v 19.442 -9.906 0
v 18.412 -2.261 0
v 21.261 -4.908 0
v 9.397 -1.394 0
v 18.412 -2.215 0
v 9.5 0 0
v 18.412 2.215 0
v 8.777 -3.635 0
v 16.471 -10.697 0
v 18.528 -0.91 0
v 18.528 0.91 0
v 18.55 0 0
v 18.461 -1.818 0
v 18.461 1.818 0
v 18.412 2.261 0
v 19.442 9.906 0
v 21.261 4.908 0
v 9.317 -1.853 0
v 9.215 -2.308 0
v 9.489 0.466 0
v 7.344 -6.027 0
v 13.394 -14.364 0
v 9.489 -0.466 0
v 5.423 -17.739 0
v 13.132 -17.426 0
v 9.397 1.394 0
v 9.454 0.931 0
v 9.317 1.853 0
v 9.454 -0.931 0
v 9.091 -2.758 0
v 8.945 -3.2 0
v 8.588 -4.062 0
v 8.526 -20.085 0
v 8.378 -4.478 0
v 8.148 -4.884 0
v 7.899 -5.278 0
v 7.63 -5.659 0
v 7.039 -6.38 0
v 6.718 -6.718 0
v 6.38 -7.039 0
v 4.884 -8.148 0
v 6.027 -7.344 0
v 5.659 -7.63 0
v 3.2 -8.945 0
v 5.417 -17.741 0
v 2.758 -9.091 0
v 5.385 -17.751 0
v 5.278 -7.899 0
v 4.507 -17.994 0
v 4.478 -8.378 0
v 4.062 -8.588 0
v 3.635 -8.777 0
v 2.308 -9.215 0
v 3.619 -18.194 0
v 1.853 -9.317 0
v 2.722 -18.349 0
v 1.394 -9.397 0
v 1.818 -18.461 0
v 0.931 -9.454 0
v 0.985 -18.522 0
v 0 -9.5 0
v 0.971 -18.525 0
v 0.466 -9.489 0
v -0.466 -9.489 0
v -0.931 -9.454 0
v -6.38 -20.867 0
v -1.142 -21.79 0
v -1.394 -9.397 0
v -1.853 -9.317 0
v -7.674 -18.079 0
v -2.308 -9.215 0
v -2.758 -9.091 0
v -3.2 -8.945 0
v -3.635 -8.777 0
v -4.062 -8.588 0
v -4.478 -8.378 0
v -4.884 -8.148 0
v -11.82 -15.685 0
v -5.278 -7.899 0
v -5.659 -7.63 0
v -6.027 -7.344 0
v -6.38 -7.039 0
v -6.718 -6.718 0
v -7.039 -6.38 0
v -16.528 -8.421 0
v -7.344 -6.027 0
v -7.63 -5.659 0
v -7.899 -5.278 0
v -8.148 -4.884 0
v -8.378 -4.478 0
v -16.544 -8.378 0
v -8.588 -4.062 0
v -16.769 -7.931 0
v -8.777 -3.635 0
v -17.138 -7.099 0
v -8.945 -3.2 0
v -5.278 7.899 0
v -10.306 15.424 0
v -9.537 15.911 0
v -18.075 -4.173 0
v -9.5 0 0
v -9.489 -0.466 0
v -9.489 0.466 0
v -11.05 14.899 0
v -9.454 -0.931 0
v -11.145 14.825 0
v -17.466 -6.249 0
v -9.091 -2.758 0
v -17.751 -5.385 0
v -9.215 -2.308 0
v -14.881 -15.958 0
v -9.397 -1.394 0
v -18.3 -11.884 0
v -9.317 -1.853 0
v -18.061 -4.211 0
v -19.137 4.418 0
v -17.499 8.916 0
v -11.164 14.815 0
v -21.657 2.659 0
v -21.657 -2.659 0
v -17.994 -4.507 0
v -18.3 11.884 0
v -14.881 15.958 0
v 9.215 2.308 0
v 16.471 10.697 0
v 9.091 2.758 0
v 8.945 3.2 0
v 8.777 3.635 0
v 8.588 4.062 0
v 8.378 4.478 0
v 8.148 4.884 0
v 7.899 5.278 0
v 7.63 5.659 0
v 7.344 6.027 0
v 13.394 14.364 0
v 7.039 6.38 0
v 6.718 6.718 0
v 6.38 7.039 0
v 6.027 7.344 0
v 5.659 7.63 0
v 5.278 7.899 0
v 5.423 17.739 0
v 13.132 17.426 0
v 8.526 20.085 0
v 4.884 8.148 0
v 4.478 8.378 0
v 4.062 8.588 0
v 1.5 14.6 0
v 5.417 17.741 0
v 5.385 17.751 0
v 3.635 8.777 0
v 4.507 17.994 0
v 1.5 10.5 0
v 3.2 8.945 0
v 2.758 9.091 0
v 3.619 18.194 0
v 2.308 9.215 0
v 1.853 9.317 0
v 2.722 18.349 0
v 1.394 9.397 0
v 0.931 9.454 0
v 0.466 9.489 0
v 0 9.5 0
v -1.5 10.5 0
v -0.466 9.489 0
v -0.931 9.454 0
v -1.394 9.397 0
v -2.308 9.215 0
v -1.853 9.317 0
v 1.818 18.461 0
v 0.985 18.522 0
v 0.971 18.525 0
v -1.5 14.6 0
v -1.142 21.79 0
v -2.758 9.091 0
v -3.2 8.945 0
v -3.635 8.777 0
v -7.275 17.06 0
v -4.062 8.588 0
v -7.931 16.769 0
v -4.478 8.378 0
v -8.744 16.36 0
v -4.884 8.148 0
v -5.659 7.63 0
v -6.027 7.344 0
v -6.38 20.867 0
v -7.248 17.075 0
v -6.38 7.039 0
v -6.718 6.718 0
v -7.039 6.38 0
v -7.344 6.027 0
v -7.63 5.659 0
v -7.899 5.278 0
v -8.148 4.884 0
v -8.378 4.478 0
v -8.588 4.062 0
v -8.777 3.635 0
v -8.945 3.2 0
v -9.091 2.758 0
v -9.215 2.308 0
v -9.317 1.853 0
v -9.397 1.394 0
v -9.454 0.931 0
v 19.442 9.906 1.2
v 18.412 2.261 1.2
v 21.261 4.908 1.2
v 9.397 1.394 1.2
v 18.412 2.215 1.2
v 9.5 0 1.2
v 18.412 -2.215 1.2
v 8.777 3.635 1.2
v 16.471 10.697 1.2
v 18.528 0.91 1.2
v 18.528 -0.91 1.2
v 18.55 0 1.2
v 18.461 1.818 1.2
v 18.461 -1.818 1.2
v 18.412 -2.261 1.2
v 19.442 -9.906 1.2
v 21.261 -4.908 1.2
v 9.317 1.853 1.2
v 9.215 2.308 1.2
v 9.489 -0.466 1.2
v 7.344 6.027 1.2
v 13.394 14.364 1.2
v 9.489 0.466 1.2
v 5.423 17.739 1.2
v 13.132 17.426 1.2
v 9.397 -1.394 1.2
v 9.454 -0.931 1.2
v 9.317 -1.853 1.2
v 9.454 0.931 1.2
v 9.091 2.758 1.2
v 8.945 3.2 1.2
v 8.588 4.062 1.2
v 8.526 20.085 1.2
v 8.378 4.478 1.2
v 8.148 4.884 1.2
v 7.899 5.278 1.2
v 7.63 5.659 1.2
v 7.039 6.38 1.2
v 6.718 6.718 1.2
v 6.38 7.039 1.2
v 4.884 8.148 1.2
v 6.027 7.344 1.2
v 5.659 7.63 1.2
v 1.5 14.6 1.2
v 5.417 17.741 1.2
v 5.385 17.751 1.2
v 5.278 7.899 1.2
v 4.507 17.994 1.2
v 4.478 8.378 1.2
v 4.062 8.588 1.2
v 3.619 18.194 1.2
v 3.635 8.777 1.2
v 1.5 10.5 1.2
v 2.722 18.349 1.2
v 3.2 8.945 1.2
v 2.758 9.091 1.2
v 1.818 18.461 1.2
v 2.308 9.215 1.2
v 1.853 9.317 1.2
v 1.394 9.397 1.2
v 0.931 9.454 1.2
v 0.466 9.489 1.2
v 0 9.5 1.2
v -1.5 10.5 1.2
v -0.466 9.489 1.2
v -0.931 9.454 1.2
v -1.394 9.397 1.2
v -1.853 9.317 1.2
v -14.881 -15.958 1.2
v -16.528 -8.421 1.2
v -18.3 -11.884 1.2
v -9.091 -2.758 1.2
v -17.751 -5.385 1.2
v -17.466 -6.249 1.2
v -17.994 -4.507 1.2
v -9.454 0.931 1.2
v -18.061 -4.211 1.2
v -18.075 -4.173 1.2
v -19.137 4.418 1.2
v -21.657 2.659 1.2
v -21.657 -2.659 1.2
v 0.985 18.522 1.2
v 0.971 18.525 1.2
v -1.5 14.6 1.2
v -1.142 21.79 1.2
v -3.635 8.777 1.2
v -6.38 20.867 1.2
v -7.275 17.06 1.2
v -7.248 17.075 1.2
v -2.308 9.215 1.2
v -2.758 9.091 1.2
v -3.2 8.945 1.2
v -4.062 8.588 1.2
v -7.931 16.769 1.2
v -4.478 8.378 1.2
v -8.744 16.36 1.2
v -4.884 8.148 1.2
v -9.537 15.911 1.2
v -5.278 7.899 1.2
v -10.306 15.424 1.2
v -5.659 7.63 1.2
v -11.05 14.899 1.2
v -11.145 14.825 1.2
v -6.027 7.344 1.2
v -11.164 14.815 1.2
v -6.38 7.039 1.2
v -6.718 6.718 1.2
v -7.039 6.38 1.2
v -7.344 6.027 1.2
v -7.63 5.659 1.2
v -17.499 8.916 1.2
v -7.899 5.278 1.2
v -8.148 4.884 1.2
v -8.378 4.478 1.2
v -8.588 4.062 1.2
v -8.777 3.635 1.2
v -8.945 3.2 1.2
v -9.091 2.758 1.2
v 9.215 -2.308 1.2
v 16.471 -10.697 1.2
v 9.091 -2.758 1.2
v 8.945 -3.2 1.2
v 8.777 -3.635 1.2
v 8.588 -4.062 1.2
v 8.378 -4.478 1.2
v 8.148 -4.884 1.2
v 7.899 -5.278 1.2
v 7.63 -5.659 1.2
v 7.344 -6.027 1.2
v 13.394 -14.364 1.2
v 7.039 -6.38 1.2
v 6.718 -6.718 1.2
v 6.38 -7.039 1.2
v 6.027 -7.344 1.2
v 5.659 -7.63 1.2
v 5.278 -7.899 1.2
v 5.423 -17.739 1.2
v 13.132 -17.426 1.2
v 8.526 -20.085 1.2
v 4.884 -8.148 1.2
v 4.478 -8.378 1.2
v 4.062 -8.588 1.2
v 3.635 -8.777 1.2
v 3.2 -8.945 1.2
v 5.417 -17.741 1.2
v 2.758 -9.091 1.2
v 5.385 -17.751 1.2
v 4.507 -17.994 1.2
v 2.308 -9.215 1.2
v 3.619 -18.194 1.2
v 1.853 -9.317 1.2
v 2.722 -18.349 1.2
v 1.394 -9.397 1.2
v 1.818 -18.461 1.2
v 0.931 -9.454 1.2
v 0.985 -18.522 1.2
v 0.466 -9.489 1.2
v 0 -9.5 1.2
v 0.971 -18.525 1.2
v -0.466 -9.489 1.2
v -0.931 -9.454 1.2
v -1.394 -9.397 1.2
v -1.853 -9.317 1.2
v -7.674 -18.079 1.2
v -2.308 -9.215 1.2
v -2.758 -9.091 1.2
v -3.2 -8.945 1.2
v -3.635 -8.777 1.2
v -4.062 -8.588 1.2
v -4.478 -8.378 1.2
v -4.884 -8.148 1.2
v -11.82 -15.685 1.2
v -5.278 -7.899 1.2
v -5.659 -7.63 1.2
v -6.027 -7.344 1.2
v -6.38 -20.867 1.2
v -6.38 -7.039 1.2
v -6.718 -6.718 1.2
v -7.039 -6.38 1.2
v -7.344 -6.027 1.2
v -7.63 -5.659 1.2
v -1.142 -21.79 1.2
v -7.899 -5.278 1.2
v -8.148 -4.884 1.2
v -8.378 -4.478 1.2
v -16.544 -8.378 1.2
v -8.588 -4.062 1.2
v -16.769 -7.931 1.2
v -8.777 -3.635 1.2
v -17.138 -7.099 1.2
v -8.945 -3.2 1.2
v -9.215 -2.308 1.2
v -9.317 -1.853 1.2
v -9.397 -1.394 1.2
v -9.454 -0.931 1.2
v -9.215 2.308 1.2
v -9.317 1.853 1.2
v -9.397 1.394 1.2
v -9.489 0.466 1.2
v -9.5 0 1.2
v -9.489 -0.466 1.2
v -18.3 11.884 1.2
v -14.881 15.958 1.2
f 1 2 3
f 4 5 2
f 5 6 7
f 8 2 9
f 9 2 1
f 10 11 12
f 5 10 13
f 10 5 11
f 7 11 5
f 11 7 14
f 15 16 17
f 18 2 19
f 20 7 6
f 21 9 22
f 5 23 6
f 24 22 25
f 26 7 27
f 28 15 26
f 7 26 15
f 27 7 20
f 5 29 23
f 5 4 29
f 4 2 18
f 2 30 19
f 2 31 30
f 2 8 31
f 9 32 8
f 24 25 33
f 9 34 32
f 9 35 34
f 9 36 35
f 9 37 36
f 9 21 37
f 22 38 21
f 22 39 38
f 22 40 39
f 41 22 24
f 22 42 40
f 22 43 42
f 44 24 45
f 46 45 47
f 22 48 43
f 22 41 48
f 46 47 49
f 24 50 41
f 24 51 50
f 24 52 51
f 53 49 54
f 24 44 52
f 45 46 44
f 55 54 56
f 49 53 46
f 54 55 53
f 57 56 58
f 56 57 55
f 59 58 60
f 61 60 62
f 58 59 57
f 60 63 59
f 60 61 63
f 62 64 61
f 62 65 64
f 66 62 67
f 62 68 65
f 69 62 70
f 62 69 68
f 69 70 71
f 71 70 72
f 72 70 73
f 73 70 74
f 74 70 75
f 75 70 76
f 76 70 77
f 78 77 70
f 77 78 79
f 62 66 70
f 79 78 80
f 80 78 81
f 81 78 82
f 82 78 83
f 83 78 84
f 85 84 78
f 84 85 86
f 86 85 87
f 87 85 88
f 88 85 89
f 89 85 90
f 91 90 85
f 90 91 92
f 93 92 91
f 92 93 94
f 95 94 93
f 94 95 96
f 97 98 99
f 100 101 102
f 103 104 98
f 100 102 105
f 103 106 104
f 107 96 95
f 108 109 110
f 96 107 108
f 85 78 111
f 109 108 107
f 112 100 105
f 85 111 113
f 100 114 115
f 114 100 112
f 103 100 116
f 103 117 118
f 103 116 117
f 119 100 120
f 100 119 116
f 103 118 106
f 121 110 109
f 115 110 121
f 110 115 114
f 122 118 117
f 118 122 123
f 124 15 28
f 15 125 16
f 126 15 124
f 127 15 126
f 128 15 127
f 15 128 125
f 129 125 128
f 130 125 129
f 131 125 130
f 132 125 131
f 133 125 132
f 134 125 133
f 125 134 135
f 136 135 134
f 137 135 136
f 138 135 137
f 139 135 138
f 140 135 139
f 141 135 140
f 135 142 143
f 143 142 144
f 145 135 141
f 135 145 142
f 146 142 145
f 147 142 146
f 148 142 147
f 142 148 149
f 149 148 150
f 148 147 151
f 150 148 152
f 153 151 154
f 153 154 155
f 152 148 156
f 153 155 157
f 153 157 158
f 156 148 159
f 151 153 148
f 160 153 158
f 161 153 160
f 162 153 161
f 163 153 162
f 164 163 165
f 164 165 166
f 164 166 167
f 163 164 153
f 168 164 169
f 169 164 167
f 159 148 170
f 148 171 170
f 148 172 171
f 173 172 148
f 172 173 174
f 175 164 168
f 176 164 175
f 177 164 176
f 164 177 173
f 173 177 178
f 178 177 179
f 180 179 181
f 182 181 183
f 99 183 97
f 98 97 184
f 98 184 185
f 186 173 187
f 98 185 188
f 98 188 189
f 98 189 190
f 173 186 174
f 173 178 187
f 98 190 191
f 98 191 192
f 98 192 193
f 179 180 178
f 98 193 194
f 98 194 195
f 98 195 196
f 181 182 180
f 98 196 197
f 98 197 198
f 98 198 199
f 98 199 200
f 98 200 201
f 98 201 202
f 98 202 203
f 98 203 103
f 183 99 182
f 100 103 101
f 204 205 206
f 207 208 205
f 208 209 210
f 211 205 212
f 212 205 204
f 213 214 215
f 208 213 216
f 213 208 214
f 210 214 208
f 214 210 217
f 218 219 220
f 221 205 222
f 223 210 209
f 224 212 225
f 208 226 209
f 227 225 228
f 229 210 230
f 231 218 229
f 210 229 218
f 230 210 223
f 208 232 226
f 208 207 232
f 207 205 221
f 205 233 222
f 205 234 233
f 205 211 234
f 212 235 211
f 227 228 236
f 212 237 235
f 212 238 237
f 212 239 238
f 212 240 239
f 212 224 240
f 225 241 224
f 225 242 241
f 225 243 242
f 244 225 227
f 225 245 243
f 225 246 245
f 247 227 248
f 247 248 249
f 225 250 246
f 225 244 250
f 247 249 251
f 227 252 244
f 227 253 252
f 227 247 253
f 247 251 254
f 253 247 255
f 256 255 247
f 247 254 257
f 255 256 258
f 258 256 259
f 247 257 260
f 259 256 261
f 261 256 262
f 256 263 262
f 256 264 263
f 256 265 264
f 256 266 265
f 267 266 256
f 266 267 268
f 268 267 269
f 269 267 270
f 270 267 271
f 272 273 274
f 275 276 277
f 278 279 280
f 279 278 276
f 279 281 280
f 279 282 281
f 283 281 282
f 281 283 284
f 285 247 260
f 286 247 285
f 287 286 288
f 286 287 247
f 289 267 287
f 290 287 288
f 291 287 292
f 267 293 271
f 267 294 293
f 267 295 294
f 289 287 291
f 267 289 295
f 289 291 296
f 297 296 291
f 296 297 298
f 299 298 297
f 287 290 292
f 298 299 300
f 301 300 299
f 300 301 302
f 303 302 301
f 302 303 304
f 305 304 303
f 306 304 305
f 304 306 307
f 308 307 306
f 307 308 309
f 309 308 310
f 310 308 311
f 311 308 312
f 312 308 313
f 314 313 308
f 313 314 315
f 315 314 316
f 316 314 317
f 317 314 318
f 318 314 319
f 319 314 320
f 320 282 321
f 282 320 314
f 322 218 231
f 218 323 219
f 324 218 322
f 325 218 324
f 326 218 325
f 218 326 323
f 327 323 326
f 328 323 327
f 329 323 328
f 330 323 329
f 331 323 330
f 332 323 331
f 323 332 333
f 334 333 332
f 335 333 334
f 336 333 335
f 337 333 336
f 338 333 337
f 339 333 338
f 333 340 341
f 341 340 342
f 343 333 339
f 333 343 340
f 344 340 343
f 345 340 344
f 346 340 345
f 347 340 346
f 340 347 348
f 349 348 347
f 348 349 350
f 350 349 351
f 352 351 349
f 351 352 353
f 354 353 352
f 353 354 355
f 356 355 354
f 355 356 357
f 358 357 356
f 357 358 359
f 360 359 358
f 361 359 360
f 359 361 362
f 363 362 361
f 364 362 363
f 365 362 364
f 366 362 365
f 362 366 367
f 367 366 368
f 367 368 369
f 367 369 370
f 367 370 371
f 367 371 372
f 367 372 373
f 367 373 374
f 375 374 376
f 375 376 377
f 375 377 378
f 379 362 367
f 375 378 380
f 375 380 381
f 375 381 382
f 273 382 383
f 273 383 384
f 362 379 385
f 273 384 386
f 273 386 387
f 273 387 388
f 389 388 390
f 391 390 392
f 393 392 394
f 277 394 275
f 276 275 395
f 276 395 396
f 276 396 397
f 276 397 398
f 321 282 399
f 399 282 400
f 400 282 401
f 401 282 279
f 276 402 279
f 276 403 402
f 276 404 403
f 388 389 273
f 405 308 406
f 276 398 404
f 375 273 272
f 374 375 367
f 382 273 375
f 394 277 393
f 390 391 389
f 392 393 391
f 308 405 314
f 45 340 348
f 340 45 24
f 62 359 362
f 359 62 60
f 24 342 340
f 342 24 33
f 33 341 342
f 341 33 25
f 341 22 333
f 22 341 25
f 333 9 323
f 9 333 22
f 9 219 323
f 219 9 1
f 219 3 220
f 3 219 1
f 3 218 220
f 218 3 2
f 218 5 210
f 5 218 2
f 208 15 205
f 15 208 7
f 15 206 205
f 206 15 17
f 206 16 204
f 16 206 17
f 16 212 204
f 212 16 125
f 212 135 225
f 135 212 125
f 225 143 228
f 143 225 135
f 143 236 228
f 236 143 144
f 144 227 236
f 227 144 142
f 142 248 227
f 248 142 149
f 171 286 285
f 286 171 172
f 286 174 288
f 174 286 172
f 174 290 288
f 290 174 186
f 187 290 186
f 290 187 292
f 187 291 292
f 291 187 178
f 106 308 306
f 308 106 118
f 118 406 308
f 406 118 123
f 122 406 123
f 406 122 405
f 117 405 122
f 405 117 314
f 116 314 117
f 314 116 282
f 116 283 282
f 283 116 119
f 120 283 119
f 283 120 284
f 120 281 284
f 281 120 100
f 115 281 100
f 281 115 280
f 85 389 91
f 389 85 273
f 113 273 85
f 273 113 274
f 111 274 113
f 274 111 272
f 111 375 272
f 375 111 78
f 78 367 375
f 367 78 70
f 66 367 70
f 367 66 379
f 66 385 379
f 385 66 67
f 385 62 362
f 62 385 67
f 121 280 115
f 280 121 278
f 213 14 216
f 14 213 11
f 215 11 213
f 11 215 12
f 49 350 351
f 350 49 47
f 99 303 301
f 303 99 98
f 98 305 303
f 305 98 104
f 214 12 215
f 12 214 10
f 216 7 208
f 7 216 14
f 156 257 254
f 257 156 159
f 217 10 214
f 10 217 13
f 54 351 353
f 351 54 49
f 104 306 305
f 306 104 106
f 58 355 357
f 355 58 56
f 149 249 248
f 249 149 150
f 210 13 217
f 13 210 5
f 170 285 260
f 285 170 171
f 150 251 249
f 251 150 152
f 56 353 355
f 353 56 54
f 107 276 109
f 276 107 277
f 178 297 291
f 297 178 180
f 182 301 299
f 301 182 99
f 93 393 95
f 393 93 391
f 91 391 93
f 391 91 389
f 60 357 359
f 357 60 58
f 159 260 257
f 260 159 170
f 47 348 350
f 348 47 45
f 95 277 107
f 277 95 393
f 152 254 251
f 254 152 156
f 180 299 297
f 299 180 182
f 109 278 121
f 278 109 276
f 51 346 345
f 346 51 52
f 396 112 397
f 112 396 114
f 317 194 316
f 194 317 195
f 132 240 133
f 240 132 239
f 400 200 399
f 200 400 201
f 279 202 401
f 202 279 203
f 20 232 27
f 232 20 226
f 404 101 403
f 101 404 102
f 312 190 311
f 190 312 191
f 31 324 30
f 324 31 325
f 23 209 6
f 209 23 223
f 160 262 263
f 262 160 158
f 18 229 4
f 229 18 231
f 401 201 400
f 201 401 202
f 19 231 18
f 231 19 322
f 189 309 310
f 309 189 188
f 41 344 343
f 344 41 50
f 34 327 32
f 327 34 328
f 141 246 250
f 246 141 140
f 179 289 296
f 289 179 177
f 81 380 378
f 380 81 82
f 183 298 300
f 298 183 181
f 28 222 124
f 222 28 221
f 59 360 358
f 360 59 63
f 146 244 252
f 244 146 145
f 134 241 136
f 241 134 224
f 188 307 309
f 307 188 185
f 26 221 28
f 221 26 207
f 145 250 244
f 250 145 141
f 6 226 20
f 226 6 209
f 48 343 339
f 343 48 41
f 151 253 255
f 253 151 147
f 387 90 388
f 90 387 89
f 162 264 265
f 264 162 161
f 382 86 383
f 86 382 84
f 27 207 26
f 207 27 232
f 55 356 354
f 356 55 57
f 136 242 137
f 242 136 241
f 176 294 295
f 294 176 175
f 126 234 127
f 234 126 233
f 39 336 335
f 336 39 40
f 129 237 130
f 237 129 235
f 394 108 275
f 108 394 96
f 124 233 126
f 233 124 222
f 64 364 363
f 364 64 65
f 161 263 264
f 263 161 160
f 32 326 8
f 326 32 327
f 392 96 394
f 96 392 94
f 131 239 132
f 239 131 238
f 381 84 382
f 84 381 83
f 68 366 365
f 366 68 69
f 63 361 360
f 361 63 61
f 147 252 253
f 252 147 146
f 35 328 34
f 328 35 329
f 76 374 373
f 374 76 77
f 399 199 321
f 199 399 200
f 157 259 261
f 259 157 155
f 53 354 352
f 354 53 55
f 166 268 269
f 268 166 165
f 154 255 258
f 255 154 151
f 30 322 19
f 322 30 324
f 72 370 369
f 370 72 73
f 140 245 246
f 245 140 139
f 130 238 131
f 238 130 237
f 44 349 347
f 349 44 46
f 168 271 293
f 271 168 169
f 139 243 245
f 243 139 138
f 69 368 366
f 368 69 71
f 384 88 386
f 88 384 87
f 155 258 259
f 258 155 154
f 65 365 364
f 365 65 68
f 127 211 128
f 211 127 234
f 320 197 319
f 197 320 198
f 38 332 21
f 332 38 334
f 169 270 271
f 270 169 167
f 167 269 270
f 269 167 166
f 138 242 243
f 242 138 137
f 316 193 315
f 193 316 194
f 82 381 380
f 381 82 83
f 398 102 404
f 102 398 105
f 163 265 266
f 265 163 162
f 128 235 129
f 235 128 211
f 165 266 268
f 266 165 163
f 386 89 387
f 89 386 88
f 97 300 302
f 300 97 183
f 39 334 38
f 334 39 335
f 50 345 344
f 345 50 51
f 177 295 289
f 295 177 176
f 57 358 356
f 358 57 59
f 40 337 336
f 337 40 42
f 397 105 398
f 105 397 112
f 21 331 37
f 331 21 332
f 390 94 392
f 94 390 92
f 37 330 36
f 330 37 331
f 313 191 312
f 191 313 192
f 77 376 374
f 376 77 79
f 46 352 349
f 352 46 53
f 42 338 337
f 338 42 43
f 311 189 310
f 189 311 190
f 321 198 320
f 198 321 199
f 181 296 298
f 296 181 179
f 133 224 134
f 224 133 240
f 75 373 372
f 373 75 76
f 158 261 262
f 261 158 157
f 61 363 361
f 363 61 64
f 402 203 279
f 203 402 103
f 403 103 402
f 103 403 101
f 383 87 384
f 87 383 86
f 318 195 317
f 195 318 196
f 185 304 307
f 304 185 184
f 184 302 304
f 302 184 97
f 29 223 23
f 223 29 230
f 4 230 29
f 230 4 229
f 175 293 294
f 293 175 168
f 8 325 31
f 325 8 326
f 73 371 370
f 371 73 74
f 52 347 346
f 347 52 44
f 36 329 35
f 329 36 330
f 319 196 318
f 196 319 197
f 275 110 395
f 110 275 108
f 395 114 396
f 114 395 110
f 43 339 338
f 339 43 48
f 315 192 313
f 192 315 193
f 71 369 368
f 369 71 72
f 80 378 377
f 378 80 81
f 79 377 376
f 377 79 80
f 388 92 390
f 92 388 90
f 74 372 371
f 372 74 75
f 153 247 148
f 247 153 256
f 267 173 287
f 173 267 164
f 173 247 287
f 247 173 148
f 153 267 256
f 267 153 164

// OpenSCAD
/*
  Elna Supermatic cam 09
  Name: W stitch
  Status: candidate

  Generated from measured parametric base v2.
  Surface mode: stepped
*/

include <_elna_measured_common.scad>;

profile_points = [
        [0.9708, 18.5246],
        [5.4235, 17.7395],
        [8.5258, 20.0854],
        [13.1316, 17.4262],
        [13.3944, 14.3638],
        [16.4715, 10.6967],
        [19.4418, 9.9061],
        [21.2608, 4.9084],
        [18.4117, 2.2607],
        [18.4117, -2.2607],
        [21.2608, -4.9084],
        [19.4418, -9.9061],
        [16.4715, -10.6967],
        [13.3944, -14.3638],
        [13.1316, -17.4262],
        [8.5258, -20.0854],
        [5.4235, -17.7395],
        [0.9708, -18.5246],
        [-1.1420, -21.7901],
        [-6.3796, -20.8666],
        [-7.6740, -18.0787],
        [-11.8196, -15.6852],
        [-14.8812, -15.9581],
        [-18.2998, -11.8840],
        [-16.5282, -8.4215],
        [-18.0746, -4.1728],
        [-21.6574, -2.6592],
        [-21.6574, 2.6592],
        [-19.1366, 4.4180],
        [-17.4994, 8.9164],
        [-18.2998, 11.8840],
        [-14.8812, 15.9581],
        [-11.1637, 14.8147],
        [-7.2481, 17.0754],
        [-6.3796, 20.8666],
        [-1.1420, 21.7901]
];

icon_points = [[-1.000,0.180], [-0.750,0.820], [-0.500,0.180], [-0.250,0.820], [0.000,0.180], [0.250,0.820], [0.500,0.180], [0.750,0.820], [1.000,0.180]];

elna_cam_ring(profile_points=profile_points);
